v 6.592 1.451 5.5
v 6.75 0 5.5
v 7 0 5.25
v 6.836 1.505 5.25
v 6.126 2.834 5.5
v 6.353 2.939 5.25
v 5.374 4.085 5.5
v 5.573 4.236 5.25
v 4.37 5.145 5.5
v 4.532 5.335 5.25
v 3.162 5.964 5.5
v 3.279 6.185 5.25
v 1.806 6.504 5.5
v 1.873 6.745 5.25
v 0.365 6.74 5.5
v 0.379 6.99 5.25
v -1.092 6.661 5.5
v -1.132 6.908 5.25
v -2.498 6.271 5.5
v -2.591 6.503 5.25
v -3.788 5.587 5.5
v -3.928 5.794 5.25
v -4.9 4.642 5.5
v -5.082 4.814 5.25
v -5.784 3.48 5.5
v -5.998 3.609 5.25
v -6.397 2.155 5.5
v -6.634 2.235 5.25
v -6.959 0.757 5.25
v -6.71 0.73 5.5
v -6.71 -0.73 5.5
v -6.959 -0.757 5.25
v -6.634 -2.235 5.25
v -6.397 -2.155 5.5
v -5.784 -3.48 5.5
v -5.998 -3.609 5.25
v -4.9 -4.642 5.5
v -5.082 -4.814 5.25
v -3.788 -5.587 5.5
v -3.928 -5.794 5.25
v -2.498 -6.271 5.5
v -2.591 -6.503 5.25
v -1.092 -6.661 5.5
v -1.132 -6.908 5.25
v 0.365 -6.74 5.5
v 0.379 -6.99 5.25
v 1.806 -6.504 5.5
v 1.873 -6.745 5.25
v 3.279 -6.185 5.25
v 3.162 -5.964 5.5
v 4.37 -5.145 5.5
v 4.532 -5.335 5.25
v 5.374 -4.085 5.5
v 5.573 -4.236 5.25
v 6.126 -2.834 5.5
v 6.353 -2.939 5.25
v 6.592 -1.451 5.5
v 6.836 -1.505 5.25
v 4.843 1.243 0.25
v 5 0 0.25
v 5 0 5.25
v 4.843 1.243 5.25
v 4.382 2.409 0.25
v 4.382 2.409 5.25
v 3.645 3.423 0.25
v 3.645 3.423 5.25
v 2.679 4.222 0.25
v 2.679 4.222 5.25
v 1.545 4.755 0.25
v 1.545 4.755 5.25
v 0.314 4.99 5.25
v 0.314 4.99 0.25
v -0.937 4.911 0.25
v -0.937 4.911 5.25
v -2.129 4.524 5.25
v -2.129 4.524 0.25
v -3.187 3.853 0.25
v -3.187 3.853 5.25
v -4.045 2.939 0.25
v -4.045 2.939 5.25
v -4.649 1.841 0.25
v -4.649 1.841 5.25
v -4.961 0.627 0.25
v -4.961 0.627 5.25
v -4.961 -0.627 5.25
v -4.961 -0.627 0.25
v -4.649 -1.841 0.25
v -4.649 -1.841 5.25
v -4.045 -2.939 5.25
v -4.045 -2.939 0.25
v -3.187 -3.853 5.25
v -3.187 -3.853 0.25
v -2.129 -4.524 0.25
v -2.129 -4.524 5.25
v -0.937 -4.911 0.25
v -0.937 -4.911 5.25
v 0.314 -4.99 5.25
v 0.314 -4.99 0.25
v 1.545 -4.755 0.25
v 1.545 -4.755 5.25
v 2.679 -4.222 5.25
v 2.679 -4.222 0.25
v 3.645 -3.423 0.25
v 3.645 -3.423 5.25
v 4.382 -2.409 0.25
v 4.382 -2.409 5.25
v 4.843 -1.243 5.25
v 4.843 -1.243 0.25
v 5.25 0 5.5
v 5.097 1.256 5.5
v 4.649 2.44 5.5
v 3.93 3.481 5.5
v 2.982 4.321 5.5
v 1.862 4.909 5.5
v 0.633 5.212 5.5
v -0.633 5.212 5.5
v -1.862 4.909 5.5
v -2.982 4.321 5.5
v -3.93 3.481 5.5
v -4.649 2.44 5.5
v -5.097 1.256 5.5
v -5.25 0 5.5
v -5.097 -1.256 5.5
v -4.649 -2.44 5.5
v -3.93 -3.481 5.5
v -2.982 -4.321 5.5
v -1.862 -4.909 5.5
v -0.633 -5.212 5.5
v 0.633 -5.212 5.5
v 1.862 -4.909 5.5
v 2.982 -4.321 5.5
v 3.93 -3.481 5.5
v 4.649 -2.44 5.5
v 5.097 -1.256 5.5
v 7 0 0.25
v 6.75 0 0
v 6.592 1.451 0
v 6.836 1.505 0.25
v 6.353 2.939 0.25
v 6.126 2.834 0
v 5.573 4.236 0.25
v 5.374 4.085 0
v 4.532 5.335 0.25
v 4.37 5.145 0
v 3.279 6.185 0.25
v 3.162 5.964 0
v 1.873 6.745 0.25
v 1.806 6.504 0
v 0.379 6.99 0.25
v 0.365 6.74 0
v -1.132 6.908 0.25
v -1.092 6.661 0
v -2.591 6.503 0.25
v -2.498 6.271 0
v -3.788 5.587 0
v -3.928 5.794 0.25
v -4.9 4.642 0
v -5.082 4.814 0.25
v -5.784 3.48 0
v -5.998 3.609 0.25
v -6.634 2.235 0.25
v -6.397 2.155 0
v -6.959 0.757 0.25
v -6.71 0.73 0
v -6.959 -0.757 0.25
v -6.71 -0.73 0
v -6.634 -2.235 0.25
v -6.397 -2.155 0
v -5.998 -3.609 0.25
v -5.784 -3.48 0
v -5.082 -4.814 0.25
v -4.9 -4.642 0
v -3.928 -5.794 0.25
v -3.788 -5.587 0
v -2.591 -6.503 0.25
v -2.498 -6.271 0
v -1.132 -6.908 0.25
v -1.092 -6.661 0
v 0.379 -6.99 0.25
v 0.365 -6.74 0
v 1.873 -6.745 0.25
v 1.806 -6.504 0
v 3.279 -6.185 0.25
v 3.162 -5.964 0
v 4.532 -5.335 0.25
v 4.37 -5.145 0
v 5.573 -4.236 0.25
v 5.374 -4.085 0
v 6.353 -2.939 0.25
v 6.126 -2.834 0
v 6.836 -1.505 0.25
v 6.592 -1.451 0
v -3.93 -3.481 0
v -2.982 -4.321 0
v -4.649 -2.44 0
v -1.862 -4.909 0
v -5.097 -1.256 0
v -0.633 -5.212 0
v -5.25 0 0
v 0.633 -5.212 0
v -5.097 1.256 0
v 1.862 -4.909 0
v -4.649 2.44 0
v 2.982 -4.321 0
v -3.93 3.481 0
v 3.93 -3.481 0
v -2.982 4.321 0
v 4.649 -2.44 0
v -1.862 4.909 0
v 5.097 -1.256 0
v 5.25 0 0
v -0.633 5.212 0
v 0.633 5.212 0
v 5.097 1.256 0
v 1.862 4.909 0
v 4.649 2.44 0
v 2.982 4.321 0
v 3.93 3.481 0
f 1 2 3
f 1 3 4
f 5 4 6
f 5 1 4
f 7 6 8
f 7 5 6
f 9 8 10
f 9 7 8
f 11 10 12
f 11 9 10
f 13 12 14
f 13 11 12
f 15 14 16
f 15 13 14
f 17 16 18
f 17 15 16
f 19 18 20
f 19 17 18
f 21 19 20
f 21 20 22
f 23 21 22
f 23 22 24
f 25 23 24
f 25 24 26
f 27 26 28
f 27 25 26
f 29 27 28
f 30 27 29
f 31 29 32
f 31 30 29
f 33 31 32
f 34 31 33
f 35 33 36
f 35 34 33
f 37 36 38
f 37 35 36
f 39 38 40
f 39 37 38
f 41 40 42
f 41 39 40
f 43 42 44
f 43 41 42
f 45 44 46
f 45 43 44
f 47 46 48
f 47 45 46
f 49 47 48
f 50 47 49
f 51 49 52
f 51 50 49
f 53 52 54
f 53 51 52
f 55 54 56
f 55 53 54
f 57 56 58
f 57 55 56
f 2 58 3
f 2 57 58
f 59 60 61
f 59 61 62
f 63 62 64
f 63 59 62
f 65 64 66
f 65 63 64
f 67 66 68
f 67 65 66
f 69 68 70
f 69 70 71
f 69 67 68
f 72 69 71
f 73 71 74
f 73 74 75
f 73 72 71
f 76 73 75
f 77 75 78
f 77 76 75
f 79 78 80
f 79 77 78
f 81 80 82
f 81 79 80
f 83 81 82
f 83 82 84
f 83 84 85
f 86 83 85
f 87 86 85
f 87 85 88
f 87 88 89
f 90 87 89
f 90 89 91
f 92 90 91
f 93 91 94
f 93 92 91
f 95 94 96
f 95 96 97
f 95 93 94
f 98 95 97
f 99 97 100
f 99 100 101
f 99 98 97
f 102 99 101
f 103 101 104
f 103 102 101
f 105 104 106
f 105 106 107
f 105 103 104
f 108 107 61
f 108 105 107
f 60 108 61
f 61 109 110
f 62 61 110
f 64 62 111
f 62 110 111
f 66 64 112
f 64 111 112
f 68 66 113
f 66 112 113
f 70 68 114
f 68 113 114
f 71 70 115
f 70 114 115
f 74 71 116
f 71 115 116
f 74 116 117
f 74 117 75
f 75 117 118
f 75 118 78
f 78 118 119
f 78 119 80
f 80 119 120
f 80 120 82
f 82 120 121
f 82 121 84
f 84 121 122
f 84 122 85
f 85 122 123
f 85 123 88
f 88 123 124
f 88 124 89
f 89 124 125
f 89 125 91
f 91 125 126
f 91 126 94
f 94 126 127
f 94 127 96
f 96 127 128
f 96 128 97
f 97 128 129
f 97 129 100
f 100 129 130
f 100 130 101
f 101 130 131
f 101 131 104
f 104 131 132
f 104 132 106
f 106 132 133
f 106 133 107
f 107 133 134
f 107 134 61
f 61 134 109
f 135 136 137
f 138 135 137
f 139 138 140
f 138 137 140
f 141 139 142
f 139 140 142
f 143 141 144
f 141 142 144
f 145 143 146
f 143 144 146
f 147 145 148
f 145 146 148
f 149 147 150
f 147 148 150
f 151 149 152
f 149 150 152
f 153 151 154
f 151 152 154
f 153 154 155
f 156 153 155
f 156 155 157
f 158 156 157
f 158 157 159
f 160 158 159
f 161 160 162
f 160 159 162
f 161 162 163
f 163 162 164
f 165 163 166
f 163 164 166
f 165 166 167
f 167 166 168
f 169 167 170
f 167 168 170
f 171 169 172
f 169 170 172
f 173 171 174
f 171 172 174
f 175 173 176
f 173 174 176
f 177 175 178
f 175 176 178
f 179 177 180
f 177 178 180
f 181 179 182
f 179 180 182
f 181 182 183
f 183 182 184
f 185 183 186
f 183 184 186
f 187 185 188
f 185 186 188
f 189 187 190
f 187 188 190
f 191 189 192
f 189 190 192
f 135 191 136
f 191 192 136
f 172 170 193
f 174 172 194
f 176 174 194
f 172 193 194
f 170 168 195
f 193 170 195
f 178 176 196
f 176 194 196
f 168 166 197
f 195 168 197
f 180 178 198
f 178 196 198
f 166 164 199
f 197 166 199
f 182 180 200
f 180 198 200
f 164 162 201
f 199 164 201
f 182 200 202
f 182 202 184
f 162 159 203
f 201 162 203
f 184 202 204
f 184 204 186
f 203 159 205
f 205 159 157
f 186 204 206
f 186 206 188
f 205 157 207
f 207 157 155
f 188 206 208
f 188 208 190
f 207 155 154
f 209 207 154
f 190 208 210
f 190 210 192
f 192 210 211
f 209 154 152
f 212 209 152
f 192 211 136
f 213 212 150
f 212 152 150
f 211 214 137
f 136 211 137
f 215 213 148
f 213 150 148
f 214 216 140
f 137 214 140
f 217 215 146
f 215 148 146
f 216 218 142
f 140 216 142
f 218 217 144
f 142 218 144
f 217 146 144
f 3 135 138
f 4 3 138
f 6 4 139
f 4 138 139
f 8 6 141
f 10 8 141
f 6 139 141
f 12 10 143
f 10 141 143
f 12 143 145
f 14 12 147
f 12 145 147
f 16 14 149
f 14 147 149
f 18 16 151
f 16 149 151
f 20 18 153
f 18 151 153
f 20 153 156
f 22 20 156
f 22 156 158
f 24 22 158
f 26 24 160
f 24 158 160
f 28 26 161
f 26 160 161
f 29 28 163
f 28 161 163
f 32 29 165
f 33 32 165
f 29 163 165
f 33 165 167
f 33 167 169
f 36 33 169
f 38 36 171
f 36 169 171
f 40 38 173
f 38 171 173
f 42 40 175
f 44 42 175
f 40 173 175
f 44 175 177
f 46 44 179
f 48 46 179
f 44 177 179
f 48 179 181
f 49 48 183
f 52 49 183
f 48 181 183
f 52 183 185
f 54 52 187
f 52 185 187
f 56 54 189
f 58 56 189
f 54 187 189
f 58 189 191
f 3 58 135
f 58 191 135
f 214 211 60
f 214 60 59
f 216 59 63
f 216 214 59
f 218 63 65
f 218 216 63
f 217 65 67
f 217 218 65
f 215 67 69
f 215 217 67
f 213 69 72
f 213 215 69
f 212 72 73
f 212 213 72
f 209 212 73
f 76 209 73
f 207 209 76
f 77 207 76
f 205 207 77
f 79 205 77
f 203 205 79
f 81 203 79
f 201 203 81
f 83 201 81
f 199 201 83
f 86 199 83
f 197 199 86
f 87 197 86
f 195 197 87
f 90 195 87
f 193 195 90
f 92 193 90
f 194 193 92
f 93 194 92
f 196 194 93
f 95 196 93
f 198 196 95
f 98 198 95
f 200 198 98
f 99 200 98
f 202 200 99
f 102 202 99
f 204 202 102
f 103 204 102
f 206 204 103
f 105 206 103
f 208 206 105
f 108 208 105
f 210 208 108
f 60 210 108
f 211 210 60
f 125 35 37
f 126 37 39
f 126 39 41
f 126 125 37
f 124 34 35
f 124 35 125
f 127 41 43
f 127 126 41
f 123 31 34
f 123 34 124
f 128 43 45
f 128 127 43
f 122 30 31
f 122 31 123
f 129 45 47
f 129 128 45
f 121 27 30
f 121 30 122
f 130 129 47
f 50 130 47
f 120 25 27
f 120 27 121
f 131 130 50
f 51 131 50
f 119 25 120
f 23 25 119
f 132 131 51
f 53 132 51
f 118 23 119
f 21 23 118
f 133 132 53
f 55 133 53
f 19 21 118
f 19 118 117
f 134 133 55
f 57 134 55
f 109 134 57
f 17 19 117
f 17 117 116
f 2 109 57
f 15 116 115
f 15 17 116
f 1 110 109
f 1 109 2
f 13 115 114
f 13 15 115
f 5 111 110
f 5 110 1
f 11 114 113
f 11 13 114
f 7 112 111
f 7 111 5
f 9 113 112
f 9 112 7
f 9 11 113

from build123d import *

# Parameters (mm, degrees)
BK_COLLAR_SKETCH_R     = 7
BK_COLLAR_SKETCH_R_2   = 5
BK_COLLAR_DEPTH        = 5.5
BK_COLLAR_CHAMFER_SIZE = 0.25


with BuildPart() as part:
    # BK Collar Sketch → BK Collar (new body)
    with BuildSketch(Plane.XY):
        Circle(BK_COLLAR_SKETCH_R)
        Circle(BK_COLLAR_SKETCH_R_2, mode=Mode.SUBTRACT)
    extrude(amount=BK_COLLAR_DEPTH)

    # BK Collar Chamfer
    bk_collar_chamfer_edges = [part.edges().sort_by_distance(p)[0] for p in [
        (-7, 0, 0),
        (-7, 0, 5.5),
        (-5, 0, 0),
        (-5, 0, 5.5),
    ]]
    chamfer(bk_collar_chamfer_edges, length=BK_COLLAR_CHAMFER_SIZE)


solid = part.part
